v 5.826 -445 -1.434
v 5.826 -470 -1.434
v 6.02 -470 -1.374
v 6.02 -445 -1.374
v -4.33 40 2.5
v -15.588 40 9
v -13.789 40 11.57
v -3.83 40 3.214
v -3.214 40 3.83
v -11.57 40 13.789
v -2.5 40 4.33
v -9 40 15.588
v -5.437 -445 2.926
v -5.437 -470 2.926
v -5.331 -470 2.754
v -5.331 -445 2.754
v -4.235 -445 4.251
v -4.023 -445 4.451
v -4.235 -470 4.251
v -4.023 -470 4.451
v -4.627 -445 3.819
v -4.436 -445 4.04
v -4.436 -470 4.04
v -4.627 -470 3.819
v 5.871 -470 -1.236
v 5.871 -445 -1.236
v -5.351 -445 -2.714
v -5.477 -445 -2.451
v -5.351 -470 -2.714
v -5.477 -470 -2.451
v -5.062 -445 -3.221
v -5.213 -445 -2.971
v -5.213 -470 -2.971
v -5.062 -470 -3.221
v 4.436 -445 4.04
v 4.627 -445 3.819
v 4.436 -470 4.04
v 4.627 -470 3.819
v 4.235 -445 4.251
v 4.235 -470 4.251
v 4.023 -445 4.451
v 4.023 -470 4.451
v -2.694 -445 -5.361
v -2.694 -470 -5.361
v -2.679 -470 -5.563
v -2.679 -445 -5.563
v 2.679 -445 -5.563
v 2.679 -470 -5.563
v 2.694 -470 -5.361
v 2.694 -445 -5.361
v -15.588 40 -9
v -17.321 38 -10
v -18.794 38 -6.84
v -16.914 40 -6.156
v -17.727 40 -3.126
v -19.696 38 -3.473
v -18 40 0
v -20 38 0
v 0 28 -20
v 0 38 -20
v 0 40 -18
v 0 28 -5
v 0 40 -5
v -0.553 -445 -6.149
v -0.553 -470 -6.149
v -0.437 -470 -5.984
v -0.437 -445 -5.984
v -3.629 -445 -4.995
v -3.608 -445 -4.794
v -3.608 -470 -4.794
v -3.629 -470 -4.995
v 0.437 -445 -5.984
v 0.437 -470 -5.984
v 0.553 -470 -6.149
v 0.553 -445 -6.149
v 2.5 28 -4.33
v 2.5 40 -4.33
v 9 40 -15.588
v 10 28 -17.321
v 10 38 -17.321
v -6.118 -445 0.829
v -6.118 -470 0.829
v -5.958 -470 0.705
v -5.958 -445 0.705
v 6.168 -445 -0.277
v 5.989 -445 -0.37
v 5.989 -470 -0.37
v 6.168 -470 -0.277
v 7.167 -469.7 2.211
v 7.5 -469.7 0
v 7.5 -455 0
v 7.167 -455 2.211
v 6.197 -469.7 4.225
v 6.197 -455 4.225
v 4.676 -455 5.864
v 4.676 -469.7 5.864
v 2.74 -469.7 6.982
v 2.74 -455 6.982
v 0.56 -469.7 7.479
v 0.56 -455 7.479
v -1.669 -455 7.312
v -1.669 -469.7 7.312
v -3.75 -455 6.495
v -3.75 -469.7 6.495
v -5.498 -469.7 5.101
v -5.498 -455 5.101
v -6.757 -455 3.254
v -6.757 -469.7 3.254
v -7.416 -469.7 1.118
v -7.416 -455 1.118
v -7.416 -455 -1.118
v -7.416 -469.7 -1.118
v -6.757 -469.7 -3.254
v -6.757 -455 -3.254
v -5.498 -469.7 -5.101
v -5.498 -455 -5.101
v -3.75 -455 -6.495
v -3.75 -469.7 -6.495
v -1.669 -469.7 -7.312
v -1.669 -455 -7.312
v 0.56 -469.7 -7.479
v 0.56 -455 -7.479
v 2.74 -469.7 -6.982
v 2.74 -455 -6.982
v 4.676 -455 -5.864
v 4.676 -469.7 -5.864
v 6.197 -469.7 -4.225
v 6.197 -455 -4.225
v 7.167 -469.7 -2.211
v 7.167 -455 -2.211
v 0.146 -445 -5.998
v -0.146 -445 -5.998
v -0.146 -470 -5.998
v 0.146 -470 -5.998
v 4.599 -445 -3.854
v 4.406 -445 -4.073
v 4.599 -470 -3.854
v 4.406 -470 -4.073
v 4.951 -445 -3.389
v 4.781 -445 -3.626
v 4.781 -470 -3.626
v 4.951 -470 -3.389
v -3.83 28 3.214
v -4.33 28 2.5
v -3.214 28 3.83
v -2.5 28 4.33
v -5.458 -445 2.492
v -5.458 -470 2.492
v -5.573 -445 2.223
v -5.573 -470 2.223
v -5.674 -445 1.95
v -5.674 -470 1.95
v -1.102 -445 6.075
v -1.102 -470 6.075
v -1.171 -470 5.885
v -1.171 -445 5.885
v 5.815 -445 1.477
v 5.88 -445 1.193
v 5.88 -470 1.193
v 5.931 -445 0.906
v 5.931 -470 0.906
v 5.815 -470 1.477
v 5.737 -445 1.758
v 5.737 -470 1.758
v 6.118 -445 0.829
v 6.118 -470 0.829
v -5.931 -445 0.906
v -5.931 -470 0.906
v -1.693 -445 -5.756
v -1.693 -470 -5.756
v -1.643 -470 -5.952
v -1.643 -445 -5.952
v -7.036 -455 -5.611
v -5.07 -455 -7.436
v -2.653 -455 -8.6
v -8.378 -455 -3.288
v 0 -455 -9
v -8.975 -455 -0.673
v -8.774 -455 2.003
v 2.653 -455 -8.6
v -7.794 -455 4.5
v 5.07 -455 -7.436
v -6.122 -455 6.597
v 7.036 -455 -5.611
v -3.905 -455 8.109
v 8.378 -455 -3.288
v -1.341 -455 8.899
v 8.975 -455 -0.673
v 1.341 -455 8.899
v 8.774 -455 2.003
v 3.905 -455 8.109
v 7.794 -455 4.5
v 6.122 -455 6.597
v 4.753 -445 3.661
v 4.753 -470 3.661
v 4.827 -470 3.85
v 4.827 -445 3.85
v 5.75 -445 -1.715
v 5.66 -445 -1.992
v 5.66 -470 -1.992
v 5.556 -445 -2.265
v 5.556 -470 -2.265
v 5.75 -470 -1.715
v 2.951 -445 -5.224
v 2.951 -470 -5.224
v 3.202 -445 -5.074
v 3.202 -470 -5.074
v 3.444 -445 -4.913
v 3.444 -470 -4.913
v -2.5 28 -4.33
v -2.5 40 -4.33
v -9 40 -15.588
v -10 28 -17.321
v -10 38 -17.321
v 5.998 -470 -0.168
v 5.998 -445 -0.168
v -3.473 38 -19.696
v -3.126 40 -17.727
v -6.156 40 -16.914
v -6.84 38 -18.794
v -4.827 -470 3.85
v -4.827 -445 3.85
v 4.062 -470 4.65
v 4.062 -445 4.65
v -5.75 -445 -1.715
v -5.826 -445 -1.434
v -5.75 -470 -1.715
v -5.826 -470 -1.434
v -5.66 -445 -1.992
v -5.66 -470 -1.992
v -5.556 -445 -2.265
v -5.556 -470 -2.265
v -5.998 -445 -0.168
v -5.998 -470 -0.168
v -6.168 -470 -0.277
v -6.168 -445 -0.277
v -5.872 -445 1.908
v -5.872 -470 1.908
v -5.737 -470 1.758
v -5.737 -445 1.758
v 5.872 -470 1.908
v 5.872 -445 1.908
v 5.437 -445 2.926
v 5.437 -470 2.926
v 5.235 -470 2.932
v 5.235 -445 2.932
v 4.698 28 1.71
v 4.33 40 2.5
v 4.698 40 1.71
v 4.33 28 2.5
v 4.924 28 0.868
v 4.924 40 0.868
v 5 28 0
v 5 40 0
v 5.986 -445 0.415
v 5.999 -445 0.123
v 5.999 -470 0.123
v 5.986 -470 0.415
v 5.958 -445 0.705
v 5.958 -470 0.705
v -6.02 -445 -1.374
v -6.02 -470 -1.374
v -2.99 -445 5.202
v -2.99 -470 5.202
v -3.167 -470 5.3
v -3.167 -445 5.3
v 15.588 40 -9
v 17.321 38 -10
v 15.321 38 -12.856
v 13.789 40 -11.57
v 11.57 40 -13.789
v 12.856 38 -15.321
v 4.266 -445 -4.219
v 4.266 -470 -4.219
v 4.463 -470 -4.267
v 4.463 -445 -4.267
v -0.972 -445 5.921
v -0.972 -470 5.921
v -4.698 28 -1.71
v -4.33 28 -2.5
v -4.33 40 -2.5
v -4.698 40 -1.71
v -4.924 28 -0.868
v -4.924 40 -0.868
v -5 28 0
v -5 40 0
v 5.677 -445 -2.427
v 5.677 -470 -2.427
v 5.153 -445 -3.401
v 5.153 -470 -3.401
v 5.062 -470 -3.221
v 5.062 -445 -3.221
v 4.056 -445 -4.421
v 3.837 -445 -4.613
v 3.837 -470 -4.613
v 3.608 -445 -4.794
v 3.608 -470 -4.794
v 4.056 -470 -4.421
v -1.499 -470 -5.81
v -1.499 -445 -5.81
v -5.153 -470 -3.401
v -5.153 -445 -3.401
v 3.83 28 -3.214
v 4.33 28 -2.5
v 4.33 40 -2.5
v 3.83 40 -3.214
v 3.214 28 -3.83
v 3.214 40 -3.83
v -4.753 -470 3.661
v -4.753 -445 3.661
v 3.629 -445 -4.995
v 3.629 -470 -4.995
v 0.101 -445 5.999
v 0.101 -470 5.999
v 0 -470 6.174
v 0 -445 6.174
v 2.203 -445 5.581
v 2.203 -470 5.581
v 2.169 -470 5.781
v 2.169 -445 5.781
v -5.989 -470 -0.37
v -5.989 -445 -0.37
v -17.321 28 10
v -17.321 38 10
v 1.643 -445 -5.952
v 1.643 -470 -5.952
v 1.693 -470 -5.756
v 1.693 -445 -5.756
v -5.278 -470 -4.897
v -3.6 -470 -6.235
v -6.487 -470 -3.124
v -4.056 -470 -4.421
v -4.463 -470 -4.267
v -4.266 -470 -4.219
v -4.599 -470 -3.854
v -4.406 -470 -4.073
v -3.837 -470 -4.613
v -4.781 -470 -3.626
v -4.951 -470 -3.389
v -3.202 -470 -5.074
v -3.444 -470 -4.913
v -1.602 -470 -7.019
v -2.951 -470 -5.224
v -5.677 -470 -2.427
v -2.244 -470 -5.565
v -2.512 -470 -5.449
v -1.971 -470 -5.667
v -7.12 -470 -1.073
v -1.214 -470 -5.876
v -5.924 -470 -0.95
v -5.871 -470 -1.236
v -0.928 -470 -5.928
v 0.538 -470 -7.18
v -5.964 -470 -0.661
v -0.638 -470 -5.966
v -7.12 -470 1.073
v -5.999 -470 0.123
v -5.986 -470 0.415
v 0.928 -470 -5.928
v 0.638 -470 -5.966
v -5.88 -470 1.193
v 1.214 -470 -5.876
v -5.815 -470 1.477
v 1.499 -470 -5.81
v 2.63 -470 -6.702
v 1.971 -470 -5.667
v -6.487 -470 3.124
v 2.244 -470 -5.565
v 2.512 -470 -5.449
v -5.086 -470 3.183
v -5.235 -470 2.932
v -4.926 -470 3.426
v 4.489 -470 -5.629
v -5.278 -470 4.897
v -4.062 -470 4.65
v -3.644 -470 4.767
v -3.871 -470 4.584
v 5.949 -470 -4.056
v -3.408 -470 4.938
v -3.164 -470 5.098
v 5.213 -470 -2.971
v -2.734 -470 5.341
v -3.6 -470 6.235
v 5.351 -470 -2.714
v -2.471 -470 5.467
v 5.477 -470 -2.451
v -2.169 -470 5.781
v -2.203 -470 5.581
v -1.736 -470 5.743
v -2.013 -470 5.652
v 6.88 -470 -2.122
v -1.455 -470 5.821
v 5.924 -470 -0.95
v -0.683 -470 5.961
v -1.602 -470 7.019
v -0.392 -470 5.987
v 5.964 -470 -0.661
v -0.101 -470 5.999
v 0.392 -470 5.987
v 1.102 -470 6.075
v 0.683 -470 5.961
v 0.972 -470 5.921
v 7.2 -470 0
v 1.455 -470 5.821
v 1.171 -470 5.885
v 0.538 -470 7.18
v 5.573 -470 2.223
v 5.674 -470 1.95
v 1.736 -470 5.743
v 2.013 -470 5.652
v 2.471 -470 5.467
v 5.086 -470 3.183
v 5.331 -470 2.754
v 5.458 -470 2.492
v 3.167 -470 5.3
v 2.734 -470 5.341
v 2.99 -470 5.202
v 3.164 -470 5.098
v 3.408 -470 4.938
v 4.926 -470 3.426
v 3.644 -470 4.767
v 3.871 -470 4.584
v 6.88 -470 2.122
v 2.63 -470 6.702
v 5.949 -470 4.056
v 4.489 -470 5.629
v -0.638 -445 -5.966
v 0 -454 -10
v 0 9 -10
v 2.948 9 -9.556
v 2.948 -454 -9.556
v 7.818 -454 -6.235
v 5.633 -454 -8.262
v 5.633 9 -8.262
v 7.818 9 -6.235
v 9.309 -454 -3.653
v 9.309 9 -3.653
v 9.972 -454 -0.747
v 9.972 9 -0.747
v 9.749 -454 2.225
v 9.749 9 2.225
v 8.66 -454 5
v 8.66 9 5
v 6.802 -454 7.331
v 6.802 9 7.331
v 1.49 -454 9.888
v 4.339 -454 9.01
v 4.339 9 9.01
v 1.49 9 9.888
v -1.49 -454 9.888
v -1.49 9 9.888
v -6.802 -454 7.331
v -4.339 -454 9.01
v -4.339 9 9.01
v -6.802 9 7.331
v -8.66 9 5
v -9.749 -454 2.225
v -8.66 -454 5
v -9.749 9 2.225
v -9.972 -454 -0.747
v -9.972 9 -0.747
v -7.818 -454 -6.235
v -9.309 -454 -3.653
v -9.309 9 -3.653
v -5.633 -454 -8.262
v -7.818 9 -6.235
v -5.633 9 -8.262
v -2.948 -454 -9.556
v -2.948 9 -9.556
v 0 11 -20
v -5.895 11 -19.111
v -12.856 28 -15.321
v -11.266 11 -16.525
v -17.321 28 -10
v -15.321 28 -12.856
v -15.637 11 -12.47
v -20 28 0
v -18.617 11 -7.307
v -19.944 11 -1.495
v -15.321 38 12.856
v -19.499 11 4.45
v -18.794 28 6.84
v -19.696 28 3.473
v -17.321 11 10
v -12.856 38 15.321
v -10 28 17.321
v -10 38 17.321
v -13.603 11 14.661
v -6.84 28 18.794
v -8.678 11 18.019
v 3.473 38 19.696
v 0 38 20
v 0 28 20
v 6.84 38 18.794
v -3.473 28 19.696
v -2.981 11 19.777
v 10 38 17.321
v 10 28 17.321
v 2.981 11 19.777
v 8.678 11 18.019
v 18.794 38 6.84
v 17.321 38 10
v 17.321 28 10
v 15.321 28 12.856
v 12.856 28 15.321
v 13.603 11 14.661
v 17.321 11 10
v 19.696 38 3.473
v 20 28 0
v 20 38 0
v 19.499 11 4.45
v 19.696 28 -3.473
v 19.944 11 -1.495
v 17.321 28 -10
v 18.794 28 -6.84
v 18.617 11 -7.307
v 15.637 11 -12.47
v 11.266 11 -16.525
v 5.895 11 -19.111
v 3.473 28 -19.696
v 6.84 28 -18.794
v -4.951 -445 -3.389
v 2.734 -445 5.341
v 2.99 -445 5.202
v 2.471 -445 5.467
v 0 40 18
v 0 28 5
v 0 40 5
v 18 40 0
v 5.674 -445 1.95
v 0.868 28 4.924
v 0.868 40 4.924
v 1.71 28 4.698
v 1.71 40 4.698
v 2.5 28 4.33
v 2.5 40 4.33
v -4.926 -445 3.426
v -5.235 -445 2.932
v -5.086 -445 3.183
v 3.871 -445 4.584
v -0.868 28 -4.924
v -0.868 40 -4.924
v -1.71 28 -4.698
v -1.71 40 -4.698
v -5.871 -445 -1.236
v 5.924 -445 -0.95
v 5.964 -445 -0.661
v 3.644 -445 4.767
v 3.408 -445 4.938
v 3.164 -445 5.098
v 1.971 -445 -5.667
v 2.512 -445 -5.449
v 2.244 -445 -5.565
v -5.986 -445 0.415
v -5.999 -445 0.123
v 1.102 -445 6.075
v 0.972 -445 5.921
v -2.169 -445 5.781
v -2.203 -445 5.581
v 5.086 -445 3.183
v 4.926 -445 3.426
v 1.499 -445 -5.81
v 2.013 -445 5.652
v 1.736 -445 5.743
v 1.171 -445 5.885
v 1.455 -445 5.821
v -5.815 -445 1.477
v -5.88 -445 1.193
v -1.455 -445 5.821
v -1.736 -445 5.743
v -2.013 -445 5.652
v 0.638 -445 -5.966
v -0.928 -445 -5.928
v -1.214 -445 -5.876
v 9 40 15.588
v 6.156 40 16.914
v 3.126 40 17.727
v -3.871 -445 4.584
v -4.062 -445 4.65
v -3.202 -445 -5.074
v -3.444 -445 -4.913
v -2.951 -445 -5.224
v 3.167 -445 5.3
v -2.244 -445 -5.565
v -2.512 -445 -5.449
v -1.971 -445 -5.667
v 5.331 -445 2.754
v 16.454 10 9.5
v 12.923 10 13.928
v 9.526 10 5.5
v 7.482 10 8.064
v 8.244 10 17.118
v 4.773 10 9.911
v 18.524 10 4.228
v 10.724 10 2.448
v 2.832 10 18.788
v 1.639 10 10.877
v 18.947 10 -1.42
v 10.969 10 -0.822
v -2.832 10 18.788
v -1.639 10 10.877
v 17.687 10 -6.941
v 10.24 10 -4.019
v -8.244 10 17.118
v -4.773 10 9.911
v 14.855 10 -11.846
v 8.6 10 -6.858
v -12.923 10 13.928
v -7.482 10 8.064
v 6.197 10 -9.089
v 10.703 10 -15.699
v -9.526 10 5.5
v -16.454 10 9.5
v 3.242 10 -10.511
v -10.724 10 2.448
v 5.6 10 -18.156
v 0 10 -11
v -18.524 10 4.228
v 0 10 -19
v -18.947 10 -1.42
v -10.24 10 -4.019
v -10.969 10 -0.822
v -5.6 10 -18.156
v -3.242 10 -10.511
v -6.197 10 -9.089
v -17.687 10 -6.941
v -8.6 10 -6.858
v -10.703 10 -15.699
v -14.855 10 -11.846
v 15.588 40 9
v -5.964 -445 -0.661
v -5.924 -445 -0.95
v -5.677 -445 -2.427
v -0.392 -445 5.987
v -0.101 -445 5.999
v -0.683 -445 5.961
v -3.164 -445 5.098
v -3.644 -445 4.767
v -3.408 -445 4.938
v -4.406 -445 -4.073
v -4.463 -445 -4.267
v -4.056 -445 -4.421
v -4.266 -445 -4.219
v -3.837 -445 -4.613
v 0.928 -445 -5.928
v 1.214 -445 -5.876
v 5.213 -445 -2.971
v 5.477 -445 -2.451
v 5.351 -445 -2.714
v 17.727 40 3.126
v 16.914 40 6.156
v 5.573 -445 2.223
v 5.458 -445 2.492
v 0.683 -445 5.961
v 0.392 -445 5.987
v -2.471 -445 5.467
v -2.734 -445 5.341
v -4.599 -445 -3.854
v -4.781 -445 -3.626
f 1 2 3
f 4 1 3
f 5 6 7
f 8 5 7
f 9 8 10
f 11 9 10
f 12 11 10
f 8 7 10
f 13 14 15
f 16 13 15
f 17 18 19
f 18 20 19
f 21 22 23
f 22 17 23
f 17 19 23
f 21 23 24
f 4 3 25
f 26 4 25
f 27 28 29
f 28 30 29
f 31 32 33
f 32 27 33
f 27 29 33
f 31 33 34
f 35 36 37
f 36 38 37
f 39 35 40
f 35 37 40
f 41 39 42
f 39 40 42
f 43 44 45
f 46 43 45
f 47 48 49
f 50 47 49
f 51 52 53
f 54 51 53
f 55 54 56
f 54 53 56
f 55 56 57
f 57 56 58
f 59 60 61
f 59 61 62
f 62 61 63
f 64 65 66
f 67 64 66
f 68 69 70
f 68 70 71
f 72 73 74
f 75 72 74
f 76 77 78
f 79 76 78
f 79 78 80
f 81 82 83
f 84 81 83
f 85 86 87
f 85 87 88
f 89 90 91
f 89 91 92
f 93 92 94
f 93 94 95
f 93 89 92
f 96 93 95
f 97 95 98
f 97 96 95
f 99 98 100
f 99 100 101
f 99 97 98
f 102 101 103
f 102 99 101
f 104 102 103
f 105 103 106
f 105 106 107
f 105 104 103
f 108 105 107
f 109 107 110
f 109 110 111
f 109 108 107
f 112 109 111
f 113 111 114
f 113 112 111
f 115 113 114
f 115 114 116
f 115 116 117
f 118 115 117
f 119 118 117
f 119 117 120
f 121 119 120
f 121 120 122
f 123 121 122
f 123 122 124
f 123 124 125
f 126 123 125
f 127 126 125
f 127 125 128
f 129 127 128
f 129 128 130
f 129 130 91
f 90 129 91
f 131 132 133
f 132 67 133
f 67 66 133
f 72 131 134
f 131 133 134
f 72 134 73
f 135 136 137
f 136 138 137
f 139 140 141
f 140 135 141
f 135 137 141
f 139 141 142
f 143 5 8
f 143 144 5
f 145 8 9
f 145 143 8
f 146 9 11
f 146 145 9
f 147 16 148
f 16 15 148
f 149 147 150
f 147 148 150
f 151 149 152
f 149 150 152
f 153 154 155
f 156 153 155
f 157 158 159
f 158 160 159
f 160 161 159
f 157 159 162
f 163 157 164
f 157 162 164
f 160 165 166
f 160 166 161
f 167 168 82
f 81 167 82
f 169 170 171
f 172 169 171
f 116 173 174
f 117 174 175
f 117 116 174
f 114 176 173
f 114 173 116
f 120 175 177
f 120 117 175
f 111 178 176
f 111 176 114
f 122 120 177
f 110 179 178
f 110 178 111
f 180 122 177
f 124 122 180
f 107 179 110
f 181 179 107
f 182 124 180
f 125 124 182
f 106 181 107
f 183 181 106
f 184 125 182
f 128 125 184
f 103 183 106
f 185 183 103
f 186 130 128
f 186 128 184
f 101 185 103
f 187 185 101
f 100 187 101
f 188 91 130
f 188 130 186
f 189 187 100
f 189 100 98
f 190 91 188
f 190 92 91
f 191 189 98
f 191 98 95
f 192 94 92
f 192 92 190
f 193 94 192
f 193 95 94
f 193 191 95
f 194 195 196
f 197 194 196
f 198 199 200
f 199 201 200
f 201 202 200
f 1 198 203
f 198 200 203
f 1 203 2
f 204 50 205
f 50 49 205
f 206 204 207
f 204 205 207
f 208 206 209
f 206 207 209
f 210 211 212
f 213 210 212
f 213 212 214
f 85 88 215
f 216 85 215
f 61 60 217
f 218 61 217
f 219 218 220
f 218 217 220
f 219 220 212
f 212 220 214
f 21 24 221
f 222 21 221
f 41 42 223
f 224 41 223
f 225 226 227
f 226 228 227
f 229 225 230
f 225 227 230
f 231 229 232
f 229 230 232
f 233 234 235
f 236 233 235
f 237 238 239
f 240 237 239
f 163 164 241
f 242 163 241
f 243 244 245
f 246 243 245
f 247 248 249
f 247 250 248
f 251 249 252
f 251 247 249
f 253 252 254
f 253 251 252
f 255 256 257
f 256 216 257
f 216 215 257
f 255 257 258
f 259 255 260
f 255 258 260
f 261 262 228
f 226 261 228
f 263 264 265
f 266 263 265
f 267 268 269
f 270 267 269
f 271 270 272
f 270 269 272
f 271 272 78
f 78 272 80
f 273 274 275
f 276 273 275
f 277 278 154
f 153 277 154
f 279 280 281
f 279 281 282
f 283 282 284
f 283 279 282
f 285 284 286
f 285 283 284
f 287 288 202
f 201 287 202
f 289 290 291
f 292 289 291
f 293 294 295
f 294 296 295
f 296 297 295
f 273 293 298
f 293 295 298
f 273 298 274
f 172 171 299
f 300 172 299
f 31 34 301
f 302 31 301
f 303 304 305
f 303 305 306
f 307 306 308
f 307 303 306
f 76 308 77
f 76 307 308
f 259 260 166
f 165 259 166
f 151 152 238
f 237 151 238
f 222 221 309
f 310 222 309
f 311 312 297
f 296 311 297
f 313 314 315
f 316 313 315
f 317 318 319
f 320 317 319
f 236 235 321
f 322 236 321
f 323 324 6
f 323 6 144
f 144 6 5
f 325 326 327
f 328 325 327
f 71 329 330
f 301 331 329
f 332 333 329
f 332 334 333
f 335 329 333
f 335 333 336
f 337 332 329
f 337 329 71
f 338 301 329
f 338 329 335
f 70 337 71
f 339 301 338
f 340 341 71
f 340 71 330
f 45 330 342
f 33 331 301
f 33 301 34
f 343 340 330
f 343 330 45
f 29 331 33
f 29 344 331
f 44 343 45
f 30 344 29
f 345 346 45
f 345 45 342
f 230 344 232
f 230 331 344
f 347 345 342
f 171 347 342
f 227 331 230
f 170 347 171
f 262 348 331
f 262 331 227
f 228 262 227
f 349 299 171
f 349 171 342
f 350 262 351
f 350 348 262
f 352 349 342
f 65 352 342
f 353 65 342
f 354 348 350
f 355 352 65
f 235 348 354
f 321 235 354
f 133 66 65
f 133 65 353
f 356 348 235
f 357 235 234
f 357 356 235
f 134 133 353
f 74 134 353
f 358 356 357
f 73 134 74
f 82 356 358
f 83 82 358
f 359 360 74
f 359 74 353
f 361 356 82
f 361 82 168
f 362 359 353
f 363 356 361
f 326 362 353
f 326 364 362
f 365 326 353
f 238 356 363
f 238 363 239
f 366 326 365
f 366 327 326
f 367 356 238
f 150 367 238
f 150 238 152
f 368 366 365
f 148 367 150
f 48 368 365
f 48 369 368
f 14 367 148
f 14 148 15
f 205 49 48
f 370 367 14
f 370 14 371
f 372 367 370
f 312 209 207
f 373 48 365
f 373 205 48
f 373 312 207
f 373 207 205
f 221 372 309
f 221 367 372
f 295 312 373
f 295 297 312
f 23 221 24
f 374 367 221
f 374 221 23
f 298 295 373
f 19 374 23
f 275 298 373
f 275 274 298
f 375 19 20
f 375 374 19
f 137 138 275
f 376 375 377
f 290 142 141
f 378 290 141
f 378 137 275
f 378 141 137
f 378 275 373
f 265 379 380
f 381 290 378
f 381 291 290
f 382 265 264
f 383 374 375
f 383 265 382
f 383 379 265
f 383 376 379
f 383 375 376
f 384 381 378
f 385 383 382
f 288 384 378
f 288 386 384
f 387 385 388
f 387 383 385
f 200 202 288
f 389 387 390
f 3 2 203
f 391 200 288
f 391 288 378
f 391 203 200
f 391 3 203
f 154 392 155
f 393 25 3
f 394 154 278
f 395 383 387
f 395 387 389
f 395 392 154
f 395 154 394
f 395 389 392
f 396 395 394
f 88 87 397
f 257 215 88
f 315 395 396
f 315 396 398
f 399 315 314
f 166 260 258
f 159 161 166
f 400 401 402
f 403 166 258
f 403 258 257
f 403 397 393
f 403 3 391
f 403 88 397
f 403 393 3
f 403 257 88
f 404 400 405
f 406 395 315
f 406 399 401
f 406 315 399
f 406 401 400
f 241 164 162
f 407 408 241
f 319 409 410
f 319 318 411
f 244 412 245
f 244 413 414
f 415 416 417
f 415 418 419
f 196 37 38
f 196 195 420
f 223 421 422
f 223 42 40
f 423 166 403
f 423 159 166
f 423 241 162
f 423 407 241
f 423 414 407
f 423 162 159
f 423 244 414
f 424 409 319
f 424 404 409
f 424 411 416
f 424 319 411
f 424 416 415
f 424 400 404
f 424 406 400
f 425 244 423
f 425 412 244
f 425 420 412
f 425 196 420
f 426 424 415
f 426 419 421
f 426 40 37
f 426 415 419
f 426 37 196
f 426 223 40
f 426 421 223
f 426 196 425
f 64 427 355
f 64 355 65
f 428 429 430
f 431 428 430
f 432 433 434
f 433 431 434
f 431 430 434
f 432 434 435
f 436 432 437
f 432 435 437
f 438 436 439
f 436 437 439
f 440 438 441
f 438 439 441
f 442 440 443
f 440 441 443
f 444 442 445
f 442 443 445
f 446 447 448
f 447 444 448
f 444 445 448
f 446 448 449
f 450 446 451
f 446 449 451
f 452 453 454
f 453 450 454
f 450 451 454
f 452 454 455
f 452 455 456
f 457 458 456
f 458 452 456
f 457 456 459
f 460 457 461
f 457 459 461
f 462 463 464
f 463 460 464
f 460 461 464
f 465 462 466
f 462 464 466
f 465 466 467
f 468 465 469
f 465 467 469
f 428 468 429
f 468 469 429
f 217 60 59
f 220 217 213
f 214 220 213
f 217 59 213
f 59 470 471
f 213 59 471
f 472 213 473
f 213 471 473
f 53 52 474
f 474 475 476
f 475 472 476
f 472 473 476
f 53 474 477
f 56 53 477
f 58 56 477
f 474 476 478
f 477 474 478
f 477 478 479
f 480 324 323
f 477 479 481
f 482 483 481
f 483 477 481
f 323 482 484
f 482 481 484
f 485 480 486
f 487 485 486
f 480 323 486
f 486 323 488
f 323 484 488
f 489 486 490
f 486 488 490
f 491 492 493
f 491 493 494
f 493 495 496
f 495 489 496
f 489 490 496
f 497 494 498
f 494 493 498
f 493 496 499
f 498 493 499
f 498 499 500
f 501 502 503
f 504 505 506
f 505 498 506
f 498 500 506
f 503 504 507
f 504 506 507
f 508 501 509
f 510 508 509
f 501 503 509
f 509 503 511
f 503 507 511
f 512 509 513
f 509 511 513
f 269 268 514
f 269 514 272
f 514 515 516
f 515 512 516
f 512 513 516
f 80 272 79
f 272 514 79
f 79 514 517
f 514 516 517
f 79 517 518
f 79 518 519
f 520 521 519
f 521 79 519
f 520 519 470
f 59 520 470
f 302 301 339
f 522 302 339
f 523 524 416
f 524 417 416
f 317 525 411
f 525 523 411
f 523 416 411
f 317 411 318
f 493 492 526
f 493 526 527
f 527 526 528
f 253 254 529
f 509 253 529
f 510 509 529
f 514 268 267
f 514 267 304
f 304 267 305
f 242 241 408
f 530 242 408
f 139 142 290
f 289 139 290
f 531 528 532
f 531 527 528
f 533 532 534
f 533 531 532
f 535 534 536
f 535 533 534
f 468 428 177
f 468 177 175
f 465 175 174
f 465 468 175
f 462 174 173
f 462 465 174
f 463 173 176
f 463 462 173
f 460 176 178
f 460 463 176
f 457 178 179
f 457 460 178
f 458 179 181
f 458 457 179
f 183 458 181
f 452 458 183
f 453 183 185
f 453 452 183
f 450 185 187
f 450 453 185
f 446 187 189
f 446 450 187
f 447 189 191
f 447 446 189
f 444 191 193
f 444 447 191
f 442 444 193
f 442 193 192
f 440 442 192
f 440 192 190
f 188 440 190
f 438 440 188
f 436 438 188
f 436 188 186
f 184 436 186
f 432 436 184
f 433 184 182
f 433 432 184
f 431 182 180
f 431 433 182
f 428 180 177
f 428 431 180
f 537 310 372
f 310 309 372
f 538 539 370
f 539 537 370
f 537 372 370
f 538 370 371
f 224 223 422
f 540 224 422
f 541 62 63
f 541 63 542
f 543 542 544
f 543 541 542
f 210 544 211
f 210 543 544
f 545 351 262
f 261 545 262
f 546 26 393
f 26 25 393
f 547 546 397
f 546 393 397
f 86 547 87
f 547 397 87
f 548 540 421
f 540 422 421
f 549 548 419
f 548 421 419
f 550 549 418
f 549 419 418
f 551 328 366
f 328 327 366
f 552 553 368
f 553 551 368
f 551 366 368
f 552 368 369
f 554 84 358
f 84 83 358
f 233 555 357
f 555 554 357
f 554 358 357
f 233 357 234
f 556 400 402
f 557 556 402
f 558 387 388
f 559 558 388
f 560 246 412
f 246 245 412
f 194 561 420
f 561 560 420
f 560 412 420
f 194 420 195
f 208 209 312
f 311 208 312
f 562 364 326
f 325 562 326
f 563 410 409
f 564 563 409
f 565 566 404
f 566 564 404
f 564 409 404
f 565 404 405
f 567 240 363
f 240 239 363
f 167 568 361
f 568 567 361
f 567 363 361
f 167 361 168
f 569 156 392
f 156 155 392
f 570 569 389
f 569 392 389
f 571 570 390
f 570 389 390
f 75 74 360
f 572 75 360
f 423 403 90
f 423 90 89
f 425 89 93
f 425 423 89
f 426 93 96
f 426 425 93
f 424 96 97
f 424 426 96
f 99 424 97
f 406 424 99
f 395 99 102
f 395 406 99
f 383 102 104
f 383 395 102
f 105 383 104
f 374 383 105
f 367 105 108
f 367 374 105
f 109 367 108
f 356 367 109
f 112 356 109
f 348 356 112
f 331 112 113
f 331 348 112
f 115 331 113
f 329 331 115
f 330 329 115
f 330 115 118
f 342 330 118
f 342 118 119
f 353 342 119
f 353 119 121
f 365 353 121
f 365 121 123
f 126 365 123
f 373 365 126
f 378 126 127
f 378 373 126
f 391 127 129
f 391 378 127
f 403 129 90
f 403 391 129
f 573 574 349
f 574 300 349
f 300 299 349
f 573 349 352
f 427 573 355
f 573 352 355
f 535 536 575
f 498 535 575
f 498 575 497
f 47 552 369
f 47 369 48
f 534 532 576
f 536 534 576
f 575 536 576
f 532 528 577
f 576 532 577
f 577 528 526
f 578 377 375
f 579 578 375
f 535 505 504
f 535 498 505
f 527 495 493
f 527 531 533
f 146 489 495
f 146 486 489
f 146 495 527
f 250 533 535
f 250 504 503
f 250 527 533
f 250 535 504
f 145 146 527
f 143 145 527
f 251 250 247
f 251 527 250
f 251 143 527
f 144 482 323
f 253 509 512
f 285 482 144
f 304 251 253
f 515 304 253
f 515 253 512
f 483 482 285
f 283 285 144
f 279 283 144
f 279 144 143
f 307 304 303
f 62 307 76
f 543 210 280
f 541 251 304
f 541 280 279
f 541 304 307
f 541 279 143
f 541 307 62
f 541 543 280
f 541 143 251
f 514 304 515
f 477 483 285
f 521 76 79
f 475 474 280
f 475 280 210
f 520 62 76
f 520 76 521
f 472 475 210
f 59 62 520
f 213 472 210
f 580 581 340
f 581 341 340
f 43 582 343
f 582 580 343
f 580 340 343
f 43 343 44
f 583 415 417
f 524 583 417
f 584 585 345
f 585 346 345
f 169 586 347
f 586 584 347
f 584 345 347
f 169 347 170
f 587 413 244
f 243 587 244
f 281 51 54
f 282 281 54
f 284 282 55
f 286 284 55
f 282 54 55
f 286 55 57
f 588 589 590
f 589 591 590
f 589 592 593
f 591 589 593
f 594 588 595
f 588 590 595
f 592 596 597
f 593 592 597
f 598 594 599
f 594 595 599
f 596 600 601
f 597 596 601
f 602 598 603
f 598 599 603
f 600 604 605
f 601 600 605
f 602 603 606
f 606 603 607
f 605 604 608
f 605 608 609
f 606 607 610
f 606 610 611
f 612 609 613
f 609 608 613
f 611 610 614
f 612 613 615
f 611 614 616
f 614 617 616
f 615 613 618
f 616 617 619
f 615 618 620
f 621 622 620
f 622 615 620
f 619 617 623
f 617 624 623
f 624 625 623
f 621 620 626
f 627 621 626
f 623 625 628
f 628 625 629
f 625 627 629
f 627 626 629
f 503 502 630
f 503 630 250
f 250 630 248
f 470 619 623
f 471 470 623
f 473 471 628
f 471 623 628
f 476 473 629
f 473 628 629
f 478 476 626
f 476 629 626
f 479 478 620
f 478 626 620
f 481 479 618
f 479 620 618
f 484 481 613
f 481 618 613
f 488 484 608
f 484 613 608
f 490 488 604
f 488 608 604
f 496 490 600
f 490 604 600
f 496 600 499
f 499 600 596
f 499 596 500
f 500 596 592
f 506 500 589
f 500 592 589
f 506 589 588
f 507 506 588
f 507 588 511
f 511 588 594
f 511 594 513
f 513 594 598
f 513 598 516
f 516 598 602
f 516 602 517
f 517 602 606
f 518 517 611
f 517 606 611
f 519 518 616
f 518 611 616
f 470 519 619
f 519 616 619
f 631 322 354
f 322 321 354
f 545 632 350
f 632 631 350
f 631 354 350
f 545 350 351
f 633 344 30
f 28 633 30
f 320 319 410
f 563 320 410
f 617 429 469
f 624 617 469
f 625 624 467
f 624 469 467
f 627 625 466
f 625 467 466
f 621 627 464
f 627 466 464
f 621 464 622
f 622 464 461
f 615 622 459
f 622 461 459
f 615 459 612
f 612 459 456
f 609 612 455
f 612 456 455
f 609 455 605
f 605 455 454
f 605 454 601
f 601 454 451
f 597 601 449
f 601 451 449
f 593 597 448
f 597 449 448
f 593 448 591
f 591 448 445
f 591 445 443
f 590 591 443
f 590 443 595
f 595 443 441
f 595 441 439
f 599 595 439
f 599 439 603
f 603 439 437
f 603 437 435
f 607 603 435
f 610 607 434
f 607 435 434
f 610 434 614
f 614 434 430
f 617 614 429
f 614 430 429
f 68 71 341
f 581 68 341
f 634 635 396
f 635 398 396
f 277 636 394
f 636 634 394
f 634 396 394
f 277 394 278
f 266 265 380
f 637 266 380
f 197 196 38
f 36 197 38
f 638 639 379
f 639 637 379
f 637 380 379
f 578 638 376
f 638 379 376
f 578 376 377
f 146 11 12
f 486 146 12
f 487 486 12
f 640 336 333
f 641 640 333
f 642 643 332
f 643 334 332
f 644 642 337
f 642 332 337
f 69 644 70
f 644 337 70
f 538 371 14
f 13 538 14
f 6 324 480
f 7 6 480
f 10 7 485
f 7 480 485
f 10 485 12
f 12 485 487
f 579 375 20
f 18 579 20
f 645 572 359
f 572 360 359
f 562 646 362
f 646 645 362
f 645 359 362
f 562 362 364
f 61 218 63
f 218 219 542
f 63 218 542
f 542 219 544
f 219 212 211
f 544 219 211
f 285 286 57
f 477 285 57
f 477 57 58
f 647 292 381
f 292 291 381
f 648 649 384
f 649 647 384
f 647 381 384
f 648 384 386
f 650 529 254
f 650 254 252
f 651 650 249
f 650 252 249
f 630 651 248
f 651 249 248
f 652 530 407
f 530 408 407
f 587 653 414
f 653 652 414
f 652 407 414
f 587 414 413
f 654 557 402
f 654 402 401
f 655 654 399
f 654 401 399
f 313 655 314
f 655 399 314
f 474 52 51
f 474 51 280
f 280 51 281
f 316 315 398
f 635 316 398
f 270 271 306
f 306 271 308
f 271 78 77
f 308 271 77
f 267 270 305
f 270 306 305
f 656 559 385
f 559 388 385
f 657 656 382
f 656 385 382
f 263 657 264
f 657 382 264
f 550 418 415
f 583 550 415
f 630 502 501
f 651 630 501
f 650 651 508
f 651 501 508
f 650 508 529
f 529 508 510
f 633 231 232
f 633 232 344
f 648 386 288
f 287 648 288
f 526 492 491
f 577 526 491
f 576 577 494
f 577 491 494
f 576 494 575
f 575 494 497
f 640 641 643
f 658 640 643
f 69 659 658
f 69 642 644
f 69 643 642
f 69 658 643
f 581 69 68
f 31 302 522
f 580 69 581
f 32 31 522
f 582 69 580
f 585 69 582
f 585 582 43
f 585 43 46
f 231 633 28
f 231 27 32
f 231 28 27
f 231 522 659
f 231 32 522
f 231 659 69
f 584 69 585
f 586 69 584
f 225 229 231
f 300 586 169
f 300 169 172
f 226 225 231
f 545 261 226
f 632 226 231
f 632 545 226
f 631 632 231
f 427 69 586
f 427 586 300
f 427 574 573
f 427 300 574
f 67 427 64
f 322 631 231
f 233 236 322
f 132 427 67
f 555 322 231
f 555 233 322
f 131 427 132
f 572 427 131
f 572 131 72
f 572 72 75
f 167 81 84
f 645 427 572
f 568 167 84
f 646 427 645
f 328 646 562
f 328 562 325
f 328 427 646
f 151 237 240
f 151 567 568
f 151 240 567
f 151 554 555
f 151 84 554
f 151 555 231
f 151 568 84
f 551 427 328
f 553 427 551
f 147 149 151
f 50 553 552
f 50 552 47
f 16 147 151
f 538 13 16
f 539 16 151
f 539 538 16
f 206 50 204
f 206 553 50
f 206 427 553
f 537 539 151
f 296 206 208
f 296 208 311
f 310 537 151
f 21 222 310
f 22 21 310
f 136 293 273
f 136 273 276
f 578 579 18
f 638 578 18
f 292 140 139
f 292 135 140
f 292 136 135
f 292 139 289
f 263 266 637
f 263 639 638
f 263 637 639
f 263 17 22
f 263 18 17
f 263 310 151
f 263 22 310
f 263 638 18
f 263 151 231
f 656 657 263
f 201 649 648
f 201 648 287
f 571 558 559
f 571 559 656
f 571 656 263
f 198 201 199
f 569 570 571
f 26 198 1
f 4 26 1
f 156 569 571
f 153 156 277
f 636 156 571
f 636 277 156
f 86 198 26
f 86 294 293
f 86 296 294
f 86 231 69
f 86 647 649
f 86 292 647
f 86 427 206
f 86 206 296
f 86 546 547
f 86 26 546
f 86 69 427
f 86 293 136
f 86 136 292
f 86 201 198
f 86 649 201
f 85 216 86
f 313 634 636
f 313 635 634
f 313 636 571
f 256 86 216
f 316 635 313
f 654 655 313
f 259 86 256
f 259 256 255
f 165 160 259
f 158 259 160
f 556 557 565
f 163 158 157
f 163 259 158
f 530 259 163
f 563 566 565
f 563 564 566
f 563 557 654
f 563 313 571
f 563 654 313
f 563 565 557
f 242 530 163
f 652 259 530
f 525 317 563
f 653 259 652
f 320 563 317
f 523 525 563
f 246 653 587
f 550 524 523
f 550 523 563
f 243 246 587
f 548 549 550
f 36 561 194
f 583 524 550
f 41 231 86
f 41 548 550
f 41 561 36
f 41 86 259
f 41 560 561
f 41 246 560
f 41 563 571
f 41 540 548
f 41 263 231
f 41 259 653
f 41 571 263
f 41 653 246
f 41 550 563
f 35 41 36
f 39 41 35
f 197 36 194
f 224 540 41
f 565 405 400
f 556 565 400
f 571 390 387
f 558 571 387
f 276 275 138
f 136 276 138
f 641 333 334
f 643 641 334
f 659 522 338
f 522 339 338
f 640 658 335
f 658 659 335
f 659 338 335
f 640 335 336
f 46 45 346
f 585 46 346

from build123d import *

# Parameters (mm, degrees)
CHAMFER1_SIZE      = 2
CUT_EXTRUDE1_DEPTH = 12
CIRPATTERN6_COUNT  = 6
CUT_EXTRUDE2_START = -12
SKETCH3_R          = 5
CUT_EXTRUDE2_DEPTH = 12
CHAMFER2_SIZE      = 1
SKETCH4_W          = 10
SKETCH4_H          = 510
SKETCH5_OUTSIDE_W  = 152.58
SKETCH5_OUTSIDE_H  = 152.58
SKETCH5_OUTSIDE_R  = 7.5
CUT_EXTRUDE3_DEPTH = 55
CHAMFER3_SIZE      = 1
SKETCH6_R          = 30.68966821
CUT_EXTRUDE4_DEPTH = 40
SKETCH7_R          = 6
CUT_EXTRUDE5_DEPTH = 25
CUT_EXTRUDE6_DEPTH = 25
CIRPATTERN7_COUNT  = 35
CHAMFER4_SIZE      = 0.3


with BuildPart() as part:
    # Sketch1 → Revolve1 (revolve)
    with BuildSketch(Plane.XY, mode=Mode.PRIVATE) as revolve1_sk:
        Polygon((0, 0), (0, 40), (20, 40), (20, 10), (10, 10), (10, 0), align=None)
    revolve(revolve1_sk.sketch.rotate(Axis((0, 0, 0), (0, 1, 0)), 90), axis=Axis((0, 0, 0), (0, 1, 0)))

    # Chamfer1
    chamfer1_edges = [part.edges().sort_by_distance(p)[0] for p in [
        (0, 40, 20),
    ]]
    chamfer(chamfer1_edges, length=CHAMFER1_SIZE)

    # Sketch2 → Cut-Extrude1 (cut)
    with BuildSketch(Plane(origin=(0, 40, 0), x_dir=(1, 0, 0), z_dir=(0, 1, 0))):
        with BuildLine():
            Line((0, 21.142627656), (0, 5))
            ThreePointArc((0, 5), (1.294095226, 4.829629131), (2.5, 4.330127019))
            Line((2.5, 4.330127019), (12.206701769, 21.142627656))
            Line((12.206701769, 21.142627656), (0, 21.142627656))
        make_face()
    cut_extrude1 = extrude(amount=-CUT_EXTRUDE1_DEPTH, mode=Mode.SUBTRACT)

    # CirPattern6: Cut-Extrude1 ×6 about axis
    cirpattern6_axis = Axis((0, 0, 0), (0, 1, 0))
    for i in range(1, CIRPATTERN6_COUNT):
        add(cut_extrude1.rotate(cirpattern6_axis, i * 360 / CIRPATTERN6_COUNT), mode=Mode.SUBTRACT)

    # Sketch3 → Cut-Extrude2 (cut)
    with BuildSketch(Plane(origin=(0, 40, 0), x_dir=(1, 0, 0), z_dir=(0, 1, 0)).offset(CUT_EXTRUDE2_START)):
        Circle(SKETCH3_R)
    extrude(amount=CUT_EXTRUDE2_DEPTH, mode=Mode.SUBTRACT)

    # Chamfer2
    chamfer2_edges = [part.edges().sort_by_distance(p)[0] for p in [
        (0, 10, 10),
        (0, 10, 20),
    ]]
    chamfer(chamfer2_edges, length=CHAMFER2_SIZE)

    # Sketch4 → Revolve2 (revolve)
    with BuildSketch(Plane.XY, mode=Mode.PRIVATE) as revolve2_sk:
        with Locations((5, -255)):
            Rectangle(SKETCH4_W, SKETCH4_H)
    revolve(revolve2_sk.sketch.rotate(Axis((0, 0, 0), (0, -1, 0)), 270), axis=Axis((0, 0, 0), (0, -1, 0)))

    # Sketch5 outside → Cut-Extrude3 (cut)
    with BuildSketch(Plane.XZ.offset(510)):
        Rectangle(SKETCH5_OUTSIDE_W, SKETCH5_OUTSIDE_H)
        Circle(SKETCH5_OUTSIDE_R, mode=Mode.SUBTRACT)
    extrude(amount=-CUT_EXTRUDE3_DEPTH, mode=Mode.SUBTRACT)

    # Chamfer3
    chamfer3_edges = [part.edges().sort_by_distance(p)[0] for p in [
        (0, -455, 10),
    ]]
    chamfer(chamfer3_edges, length=CHAMFER3_SIZE)

    # Sketch6 → Cut-Extrude4 (cut)
    with BuildSketch(Plane.XZ.offset(510)):
        Circle(SKETCH6_R)
    extrude(amount=-CUT_EXTRUDE4_DEPTH, mode=Mode.SUBTRACT)

    # Sketch7 → Cut-Extrude5 (cut)
    with BuildSketch(Plane.XZ.offset(470)):
        Circle(SKETCH7_R)
    extrude(amount=-CUT_EXTRUDE5_DEPTH, mode=Mode.SUBTRACT)

    # Sketch8 → Cut-Extrude6 (cut)
    with BuildSketch(Plane.XZ.offset(470)):
        Polygon((0, 6.174315781), (-1.45, 3.66284211), (1.45, 3.66284211), align=None)
    cut_extrude6 = extrude(amount=-CUT_EXTRUDE6_DEPTH, mode=Mode.SUBTRACT)

    # CirPattern7: Cut-Extrude6 ×35 about axis
    cirpattern7_axis = Axis((0, 0, 0), (0, 1, 0))
    for i in range(1, CIRPATTERN7_COUNT):
        add(cut_extrude6.rotate(cirpattern7_axis, i * 360 / CIRPATTERN7_COUNT), mode=Mode.SUBTRACT)

    # Chamfer4
    chamfer4_edges = [part.edges().sort_by_distance(p)[0] for p in [
        (-7.5, -470, 0),
    ]]
    chamfer(chamfer4_edges, length=CHAMFER4_SIZE)


solid = part.part
